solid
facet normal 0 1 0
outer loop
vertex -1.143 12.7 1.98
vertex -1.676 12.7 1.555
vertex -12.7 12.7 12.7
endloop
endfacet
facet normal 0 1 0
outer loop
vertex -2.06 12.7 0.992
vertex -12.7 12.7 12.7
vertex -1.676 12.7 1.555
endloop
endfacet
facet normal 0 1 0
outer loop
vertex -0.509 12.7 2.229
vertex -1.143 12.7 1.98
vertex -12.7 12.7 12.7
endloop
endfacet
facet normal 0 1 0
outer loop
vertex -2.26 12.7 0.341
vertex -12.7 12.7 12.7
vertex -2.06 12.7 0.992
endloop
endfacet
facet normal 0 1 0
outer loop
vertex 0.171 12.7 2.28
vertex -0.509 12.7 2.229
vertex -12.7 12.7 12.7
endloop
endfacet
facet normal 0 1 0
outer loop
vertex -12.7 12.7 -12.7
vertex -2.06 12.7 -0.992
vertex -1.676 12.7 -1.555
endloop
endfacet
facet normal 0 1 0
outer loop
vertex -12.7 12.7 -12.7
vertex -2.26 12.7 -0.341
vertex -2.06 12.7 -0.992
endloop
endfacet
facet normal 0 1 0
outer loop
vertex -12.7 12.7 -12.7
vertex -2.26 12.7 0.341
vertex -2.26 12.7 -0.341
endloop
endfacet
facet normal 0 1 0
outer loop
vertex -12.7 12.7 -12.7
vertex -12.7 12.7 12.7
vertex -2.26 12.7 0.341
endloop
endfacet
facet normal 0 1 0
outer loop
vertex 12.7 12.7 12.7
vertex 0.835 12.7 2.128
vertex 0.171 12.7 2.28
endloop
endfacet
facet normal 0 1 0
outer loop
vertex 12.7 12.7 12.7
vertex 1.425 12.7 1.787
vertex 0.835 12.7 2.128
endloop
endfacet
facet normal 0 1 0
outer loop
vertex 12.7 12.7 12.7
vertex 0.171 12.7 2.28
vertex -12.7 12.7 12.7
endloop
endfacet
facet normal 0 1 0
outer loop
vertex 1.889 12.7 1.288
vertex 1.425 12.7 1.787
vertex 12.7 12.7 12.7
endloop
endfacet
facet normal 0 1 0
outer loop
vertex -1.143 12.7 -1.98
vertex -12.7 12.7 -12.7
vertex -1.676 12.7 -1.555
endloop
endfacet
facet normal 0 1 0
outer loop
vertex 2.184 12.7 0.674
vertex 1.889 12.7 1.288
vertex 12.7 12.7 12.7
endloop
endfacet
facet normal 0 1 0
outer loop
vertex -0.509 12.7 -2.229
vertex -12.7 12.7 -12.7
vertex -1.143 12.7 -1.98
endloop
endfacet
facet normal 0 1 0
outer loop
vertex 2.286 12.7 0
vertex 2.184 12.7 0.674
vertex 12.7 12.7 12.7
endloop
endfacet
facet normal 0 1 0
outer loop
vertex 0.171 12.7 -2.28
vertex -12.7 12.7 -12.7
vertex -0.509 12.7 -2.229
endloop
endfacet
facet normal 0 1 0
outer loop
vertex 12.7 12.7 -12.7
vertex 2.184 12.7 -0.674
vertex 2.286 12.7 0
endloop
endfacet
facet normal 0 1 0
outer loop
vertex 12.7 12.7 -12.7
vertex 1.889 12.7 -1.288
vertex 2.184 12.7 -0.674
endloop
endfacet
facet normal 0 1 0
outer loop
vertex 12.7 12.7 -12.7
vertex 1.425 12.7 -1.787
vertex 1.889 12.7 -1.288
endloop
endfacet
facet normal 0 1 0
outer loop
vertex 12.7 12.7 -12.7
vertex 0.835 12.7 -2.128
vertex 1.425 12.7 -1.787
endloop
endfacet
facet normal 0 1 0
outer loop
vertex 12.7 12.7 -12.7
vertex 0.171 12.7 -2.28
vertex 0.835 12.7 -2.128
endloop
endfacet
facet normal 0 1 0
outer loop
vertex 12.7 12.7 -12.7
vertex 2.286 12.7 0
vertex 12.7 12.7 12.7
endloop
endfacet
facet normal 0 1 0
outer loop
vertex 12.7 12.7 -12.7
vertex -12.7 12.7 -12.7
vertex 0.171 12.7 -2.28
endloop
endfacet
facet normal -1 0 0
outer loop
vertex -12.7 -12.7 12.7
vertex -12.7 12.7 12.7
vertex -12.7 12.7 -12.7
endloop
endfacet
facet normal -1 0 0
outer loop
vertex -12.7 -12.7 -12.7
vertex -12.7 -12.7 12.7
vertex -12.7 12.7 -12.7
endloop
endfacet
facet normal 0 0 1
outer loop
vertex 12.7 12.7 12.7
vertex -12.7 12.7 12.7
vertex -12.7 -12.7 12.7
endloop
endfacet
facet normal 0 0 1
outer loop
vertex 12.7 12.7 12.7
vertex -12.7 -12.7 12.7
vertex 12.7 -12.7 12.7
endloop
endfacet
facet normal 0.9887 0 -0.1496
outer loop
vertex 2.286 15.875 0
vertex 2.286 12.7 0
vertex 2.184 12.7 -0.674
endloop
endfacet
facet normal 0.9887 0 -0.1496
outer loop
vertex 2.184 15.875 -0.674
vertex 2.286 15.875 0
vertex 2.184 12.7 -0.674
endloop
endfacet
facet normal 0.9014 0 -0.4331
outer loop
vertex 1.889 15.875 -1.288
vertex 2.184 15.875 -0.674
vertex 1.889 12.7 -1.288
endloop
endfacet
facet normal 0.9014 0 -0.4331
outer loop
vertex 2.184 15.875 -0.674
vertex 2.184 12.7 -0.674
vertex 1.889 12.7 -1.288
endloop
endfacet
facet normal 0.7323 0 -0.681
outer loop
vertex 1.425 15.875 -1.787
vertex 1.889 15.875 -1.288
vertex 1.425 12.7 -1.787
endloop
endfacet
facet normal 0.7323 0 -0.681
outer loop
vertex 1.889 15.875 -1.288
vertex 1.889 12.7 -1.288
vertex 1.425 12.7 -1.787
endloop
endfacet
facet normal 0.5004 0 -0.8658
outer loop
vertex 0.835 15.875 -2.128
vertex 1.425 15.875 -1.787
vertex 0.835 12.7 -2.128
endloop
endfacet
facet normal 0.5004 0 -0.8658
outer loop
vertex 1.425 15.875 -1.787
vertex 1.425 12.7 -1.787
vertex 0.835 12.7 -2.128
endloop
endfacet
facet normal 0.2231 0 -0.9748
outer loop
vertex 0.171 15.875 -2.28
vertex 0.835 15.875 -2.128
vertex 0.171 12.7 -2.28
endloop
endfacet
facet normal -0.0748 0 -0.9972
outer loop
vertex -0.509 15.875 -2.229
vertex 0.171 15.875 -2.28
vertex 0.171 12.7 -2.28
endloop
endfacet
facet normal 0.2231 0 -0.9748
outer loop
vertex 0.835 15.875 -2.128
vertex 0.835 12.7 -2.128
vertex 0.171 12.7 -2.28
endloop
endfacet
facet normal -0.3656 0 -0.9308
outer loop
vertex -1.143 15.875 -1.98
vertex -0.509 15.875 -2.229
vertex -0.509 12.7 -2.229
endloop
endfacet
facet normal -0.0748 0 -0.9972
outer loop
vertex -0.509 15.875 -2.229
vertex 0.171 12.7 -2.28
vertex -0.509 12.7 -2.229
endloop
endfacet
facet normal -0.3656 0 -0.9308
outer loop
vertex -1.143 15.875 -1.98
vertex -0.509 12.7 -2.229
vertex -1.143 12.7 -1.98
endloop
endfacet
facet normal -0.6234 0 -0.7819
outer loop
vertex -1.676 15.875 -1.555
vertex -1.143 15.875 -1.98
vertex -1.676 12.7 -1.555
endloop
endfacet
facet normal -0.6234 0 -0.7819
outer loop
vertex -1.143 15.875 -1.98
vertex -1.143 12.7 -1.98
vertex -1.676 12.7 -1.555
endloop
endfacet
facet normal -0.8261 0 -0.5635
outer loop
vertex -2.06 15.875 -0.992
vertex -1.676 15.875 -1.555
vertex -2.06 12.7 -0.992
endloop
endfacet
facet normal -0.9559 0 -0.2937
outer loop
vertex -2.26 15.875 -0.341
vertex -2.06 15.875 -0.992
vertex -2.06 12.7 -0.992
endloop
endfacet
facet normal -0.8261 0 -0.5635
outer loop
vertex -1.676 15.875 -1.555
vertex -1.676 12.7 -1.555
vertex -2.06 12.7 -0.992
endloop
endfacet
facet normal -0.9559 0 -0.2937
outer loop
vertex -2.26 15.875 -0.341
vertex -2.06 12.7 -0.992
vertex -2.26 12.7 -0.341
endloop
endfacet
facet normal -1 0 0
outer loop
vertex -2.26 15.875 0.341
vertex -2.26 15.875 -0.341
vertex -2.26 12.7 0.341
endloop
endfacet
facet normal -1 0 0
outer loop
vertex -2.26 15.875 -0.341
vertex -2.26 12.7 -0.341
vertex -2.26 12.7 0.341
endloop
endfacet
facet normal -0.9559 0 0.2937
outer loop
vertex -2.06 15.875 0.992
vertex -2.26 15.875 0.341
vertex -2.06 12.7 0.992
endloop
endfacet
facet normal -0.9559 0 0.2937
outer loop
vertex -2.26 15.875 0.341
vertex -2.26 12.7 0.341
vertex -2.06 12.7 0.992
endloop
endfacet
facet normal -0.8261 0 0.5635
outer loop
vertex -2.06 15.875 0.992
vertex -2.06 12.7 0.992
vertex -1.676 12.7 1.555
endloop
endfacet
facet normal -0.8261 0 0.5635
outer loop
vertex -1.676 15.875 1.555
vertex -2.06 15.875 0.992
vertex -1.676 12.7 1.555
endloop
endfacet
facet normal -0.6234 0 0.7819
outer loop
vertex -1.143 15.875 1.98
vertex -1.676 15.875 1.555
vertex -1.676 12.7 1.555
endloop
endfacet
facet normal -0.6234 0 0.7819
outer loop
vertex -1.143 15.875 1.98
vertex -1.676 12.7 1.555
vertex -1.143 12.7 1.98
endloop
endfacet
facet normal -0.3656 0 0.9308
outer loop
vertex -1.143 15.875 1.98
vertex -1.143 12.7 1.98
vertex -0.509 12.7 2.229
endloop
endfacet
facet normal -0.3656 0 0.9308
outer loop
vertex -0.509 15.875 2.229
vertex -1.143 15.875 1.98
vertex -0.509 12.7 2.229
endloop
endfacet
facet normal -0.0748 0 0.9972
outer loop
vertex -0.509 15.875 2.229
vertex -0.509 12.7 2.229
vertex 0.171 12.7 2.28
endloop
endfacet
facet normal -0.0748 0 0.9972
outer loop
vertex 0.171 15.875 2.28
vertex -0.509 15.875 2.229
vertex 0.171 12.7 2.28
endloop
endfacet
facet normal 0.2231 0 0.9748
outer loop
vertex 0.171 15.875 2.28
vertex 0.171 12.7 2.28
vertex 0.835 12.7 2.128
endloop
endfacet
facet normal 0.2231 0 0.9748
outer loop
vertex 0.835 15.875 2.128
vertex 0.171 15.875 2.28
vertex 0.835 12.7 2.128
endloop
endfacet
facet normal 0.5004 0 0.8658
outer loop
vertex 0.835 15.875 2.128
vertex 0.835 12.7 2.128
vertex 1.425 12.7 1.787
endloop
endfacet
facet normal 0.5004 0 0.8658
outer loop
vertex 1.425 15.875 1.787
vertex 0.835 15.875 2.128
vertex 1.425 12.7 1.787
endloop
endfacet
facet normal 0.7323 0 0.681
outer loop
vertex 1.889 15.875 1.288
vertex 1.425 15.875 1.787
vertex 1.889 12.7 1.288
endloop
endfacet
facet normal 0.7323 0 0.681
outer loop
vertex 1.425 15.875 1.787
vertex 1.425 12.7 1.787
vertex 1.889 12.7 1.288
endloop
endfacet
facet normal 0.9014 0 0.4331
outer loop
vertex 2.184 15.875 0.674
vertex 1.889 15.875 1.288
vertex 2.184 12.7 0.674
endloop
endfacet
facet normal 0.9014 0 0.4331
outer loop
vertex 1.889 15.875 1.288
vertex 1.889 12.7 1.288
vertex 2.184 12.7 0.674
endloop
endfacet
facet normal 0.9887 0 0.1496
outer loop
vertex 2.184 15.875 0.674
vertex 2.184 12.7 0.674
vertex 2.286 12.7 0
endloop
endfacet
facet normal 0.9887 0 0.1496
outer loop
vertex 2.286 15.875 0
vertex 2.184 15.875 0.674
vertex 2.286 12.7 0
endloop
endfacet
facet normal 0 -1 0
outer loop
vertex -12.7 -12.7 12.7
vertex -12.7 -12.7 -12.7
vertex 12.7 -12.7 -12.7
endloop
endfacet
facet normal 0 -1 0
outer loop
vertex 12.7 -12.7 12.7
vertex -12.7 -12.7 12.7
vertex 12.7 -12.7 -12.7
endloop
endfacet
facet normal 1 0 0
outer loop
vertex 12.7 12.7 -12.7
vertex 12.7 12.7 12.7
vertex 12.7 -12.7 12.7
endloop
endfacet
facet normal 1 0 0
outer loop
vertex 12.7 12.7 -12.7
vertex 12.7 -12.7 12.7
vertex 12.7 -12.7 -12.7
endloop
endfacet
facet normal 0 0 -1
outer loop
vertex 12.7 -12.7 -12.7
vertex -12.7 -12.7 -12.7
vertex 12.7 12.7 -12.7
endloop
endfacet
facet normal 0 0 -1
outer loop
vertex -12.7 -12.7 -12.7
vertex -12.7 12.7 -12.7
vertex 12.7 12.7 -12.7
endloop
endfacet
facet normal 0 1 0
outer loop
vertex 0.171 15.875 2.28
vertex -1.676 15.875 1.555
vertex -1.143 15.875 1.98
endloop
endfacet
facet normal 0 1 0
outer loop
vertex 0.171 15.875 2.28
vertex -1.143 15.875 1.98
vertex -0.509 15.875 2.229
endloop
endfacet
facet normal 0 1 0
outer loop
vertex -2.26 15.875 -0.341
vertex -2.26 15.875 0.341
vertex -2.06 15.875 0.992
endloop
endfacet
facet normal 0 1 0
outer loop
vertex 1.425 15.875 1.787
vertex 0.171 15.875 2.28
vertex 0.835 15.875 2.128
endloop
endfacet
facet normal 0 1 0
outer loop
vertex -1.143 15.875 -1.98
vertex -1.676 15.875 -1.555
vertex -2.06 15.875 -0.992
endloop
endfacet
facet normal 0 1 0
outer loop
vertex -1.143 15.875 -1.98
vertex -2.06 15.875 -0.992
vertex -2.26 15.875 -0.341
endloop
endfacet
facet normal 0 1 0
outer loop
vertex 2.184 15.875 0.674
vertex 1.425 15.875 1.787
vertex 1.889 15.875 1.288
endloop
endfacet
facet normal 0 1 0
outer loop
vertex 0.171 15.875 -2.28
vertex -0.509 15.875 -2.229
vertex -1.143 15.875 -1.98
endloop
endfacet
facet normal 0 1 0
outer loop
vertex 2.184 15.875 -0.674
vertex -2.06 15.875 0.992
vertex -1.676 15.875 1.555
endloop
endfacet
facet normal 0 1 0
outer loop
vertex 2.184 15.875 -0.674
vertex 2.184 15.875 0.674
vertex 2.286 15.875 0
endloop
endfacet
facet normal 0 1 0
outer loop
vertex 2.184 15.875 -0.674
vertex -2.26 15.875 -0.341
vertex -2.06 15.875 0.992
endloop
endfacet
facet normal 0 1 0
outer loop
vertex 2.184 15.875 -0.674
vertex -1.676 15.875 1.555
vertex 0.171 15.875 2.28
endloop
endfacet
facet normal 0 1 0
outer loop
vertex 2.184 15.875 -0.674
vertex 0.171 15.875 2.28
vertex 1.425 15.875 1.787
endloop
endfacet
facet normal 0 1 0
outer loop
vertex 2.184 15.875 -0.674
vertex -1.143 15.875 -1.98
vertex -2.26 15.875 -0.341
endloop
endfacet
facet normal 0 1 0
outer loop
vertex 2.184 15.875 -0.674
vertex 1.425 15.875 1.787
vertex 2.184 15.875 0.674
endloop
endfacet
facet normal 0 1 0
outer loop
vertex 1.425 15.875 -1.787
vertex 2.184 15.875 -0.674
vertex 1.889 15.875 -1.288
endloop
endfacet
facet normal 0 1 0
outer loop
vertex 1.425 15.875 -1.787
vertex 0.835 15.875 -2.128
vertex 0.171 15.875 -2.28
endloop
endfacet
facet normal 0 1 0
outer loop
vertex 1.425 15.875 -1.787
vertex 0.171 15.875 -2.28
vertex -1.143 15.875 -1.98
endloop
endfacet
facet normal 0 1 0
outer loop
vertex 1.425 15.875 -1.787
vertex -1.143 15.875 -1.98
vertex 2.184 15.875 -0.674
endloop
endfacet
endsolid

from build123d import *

# Parameters (mm, degrees)
SKETCH1_W           = 25.4
SKETCH1_H           = 25.4
BOSS_EXTRUDE1_DEPTH = 12.7
SKETCH2_R           = 2.286
BOSS_EXTRUDE2_DEPTH = 3.175


with BuildPart() as part:
    # Sketch1 → Boss-Extrude1 (new body, symmetric)
    with BuildSketch(Plane(origin=(0, 0, 0), x_dir=(1, 0, 0), z_dir=(0, 1, 0))):
        Rectangle(SKETCH1_W, SKETCH1_H)
    extrude(amount=BOSS_EXTRUDE1_DEPTH, both=True)

    # Sketch2 → Boss-Extrude2 (add)
    with BuildSketch(Plane(origin=(0, 12.7, 0), x_dir=(1, 0, 0), z_dir=(0, 1, 0))):
        Circle(SKETCH2_R)
    extrude(amount=BOSS_EXTRUDE2_DEPTH)


solid = part.part
